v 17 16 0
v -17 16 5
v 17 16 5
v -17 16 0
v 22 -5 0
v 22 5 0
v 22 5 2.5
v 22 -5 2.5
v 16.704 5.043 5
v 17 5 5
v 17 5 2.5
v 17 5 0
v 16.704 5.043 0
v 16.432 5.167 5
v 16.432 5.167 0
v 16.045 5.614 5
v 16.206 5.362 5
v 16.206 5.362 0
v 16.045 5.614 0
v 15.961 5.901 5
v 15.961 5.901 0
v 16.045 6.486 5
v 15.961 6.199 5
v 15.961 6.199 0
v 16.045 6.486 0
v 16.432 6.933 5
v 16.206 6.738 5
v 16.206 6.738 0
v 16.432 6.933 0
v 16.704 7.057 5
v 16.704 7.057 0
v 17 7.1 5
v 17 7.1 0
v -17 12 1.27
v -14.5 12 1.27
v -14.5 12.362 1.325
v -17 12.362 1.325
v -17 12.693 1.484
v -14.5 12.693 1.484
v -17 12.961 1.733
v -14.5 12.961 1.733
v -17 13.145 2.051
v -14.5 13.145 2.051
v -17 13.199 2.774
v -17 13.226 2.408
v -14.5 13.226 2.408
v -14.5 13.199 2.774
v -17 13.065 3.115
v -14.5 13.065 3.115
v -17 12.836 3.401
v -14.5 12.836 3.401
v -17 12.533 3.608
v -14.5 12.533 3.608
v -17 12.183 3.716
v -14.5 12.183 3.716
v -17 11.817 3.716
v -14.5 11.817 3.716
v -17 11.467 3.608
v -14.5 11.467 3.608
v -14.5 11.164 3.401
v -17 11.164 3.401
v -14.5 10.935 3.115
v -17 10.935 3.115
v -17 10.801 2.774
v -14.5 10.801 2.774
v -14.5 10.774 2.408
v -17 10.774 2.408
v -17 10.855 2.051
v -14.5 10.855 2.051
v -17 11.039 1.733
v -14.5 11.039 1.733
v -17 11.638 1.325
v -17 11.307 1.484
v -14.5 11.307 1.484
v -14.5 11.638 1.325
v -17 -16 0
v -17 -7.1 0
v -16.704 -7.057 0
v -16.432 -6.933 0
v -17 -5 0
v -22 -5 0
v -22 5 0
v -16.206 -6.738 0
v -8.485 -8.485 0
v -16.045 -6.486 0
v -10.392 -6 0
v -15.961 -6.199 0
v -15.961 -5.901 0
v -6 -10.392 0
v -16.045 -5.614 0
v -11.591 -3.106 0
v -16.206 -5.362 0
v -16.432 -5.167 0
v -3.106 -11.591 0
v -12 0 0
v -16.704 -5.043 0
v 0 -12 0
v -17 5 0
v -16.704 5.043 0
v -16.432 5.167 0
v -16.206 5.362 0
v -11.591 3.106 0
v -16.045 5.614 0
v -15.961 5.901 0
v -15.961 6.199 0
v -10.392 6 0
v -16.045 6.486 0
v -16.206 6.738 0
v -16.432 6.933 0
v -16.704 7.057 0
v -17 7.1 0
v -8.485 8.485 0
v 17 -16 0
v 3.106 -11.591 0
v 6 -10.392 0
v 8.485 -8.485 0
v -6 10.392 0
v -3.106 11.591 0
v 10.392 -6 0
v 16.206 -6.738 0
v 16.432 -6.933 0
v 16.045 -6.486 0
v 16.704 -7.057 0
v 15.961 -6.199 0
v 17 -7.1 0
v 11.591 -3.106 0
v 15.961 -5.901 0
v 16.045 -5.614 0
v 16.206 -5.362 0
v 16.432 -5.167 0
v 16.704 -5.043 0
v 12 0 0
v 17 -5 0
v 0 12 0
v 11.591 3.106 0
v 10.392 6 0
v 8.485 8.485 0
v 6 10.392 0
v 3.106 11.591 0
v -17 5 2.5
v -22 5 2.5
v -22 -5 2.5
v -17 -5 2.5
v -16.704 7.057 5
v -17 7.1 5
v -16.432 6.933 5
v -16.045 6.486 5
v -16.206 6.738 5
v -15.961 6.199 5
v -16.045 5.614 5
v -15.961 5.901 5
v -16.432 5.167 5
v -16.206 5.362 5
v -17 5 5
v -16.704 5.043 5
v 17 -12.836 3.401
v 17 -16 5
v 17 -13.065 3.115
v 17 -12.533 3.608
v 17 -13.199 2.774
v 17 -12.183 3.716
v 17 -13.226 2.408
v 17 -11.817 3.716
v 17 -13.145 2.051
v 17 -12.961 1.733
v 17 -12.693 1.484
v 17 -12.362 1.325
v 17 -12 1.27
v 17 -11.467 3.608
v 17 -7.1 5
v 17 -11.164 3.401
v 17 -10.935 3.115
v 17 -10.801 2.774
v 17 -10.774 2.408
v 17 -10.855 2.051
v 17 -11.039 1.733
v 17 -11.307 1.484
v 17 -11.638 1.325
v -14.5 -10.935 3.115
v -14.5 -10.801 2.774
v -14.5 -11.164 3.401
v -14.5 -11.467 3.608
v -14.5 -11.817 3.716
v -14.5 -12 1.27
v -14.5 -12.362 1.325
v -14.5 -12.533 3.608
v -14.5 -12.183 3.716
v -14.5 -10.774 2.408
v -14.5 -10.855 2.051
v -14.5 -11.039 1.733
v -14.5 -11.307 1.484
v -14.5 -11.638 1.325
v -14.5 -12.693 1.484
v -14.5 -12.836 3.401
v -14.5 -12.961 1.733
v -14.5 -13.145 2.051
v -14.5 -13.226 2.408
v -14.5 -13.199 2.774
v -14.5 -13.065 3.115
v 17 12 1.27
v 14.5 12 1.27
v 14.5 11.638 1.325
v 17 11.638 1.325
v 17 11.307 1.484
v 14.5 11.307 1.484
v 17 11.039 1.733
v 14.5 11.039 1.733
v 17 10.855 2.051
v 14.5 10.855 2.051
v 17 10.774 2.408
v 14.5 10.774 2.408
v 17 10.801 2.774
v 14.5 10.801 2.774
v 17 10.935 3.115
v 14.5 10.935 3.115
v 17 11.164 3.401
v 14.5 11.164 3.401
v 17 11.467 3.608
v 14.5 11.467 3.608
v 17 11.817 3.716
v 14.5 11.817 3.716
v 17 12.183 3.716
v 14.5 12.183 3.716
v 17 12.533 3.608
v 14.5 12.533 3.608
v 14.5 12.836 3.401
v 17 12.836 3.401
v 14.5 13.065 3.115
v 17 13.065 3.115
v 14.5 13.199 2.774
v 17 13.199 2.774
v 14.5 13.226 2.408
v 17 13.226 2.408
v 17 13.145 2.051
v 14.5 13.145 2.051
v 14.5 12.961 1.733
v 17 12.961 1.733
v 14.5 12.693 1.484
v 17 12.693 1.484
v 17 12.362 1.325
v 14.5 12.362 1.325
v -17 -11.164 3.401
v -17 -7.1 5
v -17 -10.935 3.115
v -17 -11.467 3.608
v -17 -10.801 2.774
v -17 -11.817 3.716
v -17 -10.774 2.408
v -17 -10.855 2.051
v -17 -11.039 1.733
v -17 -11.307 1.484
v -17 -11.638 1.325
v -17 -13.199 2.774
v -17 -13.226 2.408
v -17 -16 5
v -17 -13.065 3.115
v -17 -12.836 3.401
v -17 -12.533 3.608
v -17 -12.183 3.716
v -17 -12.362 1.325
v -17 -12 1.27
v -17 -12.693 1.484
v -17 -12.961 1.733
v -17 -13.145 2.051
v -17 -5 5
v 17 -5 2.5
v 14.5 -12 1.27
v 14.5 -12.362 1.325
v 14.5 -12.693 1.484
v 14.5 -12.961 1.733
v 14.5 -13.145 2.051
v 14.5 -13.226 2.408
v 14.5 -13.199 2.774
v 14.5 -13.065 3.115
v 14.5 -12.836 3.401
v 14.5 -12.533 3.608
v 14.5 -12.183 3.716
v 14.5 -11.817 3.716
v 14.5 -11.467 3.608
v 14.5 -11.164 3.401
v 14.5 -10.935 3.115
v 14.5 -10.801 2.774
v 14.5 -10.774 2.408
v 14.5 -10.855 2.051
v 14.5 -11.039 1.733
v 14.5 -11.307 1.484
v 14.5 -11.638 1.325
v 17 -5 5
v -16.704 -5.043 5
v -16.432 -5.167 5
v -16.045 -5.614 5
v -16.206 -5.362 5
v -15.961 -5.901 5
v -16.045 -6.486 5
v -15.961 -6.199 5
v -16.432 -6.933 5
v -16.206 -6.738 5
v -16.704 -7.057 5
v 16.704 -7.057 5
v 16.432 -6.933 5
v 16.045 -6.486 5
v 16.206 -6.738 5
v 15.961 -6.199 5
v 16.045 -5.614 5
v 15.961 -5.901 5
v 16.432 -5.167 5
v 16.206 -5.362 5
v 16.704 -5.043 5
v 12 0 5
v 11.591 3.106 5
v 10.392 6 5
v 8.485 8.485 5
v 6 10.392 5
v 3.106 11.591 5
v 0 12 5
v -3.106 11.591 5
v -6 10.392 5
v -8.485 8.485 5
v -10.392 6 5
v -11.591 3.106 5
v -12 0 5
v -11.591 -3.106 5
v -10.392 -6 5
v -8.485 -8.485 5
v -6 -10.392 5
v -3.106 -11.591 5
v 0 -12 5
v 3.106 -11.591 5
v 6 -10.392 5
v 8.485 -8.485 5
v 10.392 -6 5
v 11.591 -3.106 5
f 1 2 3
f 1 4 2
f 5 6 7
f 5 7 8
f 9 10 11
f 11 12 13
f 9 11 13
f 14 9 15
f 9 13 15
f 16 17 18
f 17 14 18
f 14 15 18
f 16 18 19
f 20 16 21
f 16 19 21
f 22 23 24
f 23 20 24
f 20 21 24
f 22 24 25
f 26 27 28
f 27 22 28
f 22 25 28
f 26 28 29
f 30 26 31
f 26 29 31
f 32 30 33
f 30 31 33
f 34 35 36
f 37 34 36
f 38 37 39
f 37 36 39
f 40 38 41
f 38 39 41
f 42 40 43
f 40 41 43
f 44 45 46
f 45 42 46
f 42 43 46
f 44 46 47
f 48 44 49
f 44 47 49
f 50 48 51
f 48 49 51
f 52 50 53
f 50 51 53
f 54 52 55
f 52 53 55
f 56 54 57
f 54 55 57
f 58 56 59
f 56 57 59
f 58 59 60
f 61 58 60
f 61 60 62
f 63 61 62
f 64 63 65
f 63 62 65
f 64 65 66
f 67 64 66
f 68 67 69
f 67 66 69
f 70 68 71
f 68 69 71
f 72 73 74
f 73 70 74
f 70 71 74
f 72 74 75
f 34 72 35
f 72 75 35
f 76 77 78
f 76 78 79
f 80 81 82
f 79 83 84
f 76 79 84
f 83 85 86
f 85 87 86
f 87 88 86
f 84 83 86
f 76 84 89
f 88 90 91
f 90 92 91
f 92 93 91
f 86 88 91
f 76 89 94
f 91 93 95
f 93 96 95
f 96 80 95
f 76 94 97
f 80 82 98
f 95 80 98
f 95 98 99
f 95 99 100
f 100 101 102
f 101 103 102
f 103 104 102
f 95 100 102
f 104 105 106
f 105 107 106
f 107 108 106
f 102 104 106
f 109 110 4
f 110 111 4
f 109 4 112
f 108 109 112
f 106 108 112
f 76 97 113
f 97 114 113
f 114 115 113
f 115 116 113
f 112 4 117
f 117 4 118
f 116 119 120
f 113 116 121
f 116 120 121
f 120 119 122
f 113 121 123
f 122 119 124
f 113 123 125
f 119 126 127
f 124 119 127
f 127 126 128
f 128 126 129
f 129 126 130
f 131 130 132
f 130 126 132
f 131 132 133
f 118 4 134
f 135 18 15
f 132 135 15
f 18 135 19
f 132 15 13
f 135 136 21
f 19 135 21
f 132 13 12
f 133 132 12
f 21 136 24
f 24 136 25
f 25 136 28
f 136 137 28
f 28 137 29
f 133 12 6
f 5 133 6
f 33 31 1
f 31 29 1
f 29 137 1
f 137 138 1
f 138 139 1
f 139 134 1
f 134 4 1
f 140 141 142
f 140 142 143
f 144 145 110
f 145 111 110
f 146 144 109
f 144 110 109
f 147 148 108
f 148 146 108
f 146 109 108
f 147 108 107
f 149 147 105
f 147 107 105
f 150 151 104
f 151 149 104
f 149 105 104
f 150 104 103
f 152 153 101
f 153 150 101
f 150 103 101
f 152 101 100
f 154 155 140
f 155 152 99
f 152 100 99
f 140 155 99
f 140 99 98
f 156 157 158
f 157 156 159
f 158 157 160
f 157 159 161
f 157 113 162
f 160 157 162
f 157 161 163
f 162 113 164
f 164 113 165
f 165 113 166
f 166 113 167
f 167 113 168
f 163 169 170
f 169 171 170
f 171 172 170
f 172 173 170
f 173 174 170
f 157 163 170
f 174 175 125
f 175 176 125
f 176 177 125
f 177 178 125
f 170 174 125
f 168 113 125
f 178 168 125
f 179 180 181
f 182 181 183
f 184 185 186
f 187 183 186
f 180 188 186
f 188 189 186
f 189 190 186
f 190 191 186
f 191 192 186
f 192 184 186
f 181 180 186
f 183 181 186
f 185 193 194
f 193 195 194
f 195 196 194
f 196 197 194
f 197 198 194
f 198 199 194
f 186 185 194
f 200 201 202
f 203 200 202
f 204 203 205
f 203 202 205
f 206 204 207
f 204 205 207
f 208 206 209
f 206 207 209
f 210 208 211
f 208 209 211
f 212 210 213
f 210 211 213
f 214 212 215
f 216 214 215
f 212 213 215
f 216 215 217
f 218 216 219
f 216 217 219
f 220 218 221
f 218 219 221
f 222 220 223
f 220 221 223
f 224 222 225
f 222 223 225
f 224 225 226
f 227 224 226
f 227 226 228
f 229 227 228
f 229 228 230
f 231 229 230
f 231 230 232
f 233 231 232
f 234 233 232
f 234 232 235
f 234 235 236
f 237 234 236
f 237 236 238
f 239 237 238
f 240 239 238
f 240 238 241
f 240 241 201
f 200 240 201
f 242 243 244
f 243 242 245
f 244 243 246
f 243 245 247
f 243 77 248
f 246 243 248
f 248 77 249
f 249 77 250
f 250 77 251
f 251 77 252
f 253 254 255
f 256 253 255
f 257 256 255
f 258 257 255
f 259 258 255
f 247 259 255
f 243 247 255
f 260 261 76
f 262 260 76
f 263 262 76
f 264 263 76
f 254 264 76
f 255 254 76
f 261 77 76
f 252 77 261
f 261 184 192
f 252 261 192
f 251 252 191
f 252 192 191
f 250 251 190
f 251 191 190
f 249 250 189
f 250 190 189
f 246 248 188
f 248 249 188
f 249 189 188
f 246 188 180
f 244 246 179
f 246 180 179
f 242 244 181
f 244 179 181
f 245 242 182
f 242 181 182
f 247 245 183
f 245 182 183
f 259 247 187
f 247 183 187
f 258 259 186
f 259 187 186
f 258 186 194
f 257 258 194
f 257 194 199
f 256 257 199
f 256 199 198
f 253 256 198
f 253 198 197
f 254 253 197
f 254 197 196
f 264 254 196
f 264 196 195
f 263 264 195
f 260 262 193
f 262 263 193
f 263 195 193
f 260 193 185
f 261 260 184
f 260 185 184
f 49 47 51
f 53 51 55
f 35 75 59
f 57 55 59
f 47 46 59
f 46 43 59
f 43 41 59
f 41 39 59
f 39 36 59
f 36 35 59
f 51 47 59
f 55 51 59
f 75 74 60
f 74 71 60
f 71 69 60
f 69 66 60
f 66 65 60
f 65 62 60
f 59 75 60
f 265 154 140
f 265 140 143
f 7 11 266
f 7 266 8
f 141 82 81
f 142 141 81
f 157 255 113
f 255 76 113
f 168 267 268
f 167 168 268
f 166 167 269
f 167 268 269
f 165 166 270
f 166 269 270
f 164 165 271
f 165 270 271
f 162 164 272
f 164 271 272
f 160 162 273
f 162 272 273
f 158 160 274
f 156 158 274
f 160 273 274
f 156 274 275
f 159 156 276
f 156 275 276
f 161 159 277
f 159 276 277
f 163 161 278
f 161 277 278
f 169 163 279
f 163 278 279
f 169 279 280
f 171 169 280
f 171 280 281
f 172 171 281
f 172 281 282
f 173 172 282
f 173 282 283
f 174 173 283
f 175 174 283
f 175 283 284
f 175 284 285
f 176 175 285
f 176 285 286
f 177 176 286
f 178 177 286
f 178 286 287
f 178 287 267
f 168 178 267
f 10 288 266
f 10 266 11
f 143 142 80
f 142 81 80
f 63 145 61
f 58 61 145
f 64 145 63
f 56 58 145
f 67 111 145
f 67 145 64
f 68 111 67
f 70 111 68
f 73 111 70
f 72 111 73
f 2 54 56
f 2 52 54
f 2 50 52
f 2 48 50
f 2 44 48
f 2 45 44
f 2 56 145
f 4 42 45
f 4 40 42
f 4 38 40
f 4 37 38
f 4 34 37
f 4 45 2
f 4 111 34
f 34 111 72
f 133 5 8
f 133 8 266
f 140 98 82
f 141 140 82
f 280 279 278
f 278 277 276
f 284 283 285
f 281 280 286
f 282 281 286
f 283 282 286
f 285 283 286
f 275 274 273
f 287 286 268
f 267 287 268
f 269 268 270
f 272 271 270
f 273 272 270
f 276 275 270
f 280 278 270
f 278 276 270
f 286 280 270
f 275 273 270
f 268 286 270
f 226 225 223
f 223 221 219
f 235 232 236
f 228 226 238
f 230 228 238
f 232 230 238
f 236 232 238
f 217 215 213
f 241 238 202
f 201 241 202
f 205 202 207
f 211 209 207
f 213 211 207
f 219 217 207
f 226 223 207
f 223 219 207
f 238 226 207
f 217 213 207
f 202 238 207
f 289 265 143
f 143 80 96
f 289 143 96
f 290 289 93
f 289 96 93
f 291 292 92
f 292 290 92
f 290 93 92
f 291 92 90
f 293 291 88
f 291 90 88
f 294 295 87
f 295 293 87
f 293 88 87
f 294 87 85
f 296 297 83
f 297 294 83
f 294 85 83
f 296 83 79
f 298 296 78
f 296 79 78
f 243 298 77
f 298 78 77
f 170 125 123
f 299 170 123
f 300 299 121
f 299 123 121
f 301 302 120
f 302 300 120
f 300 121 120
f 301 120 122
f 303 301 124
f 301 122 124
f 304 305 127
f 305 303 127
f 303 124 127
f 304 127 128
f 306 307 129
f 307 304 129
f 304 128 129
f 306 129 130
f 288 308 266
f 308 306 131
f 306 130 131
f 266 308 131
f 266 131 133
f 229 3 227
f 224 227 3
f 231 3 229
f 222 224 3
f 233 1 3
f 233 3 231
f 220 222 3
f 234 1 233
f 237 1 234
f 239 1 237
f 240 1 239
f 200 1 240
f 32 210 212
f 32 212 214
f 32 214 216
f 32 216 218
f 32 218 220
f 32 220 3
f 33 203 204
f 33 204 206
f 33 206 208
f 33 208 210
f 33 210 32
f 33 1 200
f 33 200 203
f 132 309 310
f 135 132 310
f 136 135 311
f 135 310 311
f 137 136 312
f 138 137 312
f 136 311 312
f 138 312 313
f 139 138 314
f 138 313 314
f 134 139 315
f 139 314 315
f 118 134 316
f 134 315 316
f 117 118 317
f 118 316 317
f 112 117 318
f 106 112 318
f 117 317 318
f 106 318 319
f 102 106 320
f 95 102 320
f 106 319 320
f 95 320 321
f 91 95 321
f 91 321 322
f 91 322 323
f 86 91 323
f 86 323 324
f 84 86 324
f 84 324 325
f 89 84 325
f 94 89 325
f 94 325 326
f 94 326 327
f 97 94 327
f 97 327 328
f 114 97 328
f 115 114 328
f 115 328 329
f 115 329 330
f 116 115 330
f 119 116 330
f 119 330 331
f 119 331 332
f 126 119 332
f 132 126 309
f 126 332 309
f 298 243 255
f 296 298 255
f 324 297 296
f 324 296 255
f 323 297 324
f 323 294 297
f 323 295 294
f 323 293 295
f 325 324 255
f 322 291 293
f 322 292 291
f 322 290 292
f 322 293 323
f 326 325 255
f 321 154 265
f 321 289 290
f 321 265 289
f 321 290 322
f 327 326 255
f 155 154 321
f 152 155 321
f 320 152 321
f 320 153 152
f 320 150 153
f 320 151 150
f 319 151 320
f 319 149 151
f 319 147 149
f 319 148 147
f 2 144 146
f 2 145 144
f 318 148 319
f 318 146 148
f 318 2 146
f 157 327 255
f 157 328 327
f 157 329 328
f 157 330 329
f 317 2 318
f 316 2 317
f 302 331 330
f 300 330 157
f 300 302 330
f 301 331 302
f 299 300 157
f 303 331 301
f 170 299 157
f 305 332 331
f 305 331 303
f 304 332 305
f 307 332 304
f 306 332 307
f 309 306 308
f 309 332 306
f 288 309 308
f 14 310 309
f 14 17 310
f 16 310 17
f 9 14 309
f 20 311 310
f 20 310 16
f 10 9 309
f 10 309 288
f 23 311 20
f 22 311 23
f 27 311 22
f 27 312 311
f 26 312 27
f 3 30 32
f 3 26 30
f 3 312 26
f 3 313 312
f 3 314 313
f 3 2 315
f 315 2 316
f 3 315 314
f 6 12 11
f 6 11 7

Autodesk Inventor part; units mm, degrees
ref_plane "YZ Plane" through (0, 0, 0) normal (1, 0, 0) x (0, 1, 0)
ref_plane "XZ Plane" through (0, 0, 0) normal (0, 1, 0) x (-1, 0, 0)
ref_plane "XY Plane" through (0, 0, 0) normal (0, 0, 1) x (1, 0, 0)
sketch "スケッチ1" plane through (0, 0, 0) normal (0, 0, 1) x (1, 0, 0)
  line L0 (-17, -16) -> (17, -16) construction
  line L1 (17, -16) -> (17, 16) construction
  line L2 (17, 16) -> (-17, 16) construction
  line L3 (-17, 16) -> (-17, -16) construction
  line L4 (-17, -16) -> (17, 16) construction
  line L5 (17, -16) -> (-17, 16) construction
  line L6 (-17, 7.1) -> (-17, 16)
  line L7 (-17, 16) -> (17, 16)
  line L8 (17, 16) -> (17, 7.1)
  line L9 (-17, 5) -> (-22, 5)
  line L10 (-22, 5) -> (-22, -5)
  line L11 (-22, -5) -> (-17, -5)
  line L12 (17, 5) -> (22, 5)
  line L13 (22, 5) -> (22, -5)
  line L14 (22, -5) -> (17, -5)
  line L15 (-17, -7.1) -> (-17, -16)
  line L16 (-17, -16) -> (17, -16)
  line L17 (17, -16) -> (17, -7.1)
  arc A0 (-17, 5) -> (-17, 7.1) centre (-17, 6.05) ccw
  arc A1 (-17, -7.1) -> (-17, -5) centre (-17, -6.05) ccw
  arc A2 (17, 7.1) -> (17, 5) centre (17, 6.05) ccw
  arc A3 (17, -5) -> (17, -7.1) centre (17, -6.05) ccw
  line L18 (0, 0) -> (-17, 0) construction
  line L19 (0, 0) -> (0, 16) construction
  dimension "d87" = 32
  dimension "d88" = 1.05
  dimension "d89" = 5
  dimension "d90" = 11
  dimension "d91" = 34
extrude "押し出し1" add sketch "スケッチ1" along normal blind 5
sketch "スケッチ2" plane through (0, 0, 5) normal (0, 0, 1) x (1, 0, 0)
  line L0 (-17, 16) -> (-17, 7.1) projected
  line L1 (17, 7.1) -> (17, 16) projected
  line L2 (-28.2886, 18.8938) -> (-17, 18.8938)
  line L3 (-17, 18.8938) -> (-17, -23.6662)
  line L4 (-17, -23.6662) -> (-28.2886, -23.6662)
  line L5 (-28.2886, -23.6662) -> (-28.2886, 18.8938)
  line L6 (17, 13.565) -> (34.37, 13.565)
  line L7 (34.37, 13.565) -> (34.37, -20.2305)
  line L8 (34.37, -20.2305) -> (17, -20.2305)
  line L9 (17, -20.2305) -> (17, 13.565)
  point P0 (0, 0)
extrude "押し出し2" cut sketch "スケッチ2" against normal blind 2.5
sketch "スケッチ3" plane through (17, -16, 0) normal (1, 0, 0) x (0, 0, -1)
  line L0 (0, 0) -> (-5, 0) projected
  line L1 (-5, 11) -> (-5, 21) construction
  line L2 (-5, 16) -> (0, 16) construction
  point P0 (-2.5, 4)
  point P1 (-2.5, 28)
  point P2 (-2.5, 0)
  dimension "d96" = 4
hole "穴1" at (17, -12, 2.5) at (17, 12, 2.5) direction (-1, 0, 0) diameter 2.459 depth 2.5 thread size "M3x0.5" class "6H" standard "ISO Metric profile"
mirror "ミラー1" about plane through (0, 0, 0) normal (1, 0, 0) of "穴1"
sketch "スケッチ4" plane through (0, 0, 5) normal (0, 0, 1) x (1, 0, 0)
  line L0 (-17, -16) -> (17, -16) projected
  line L1 (17, -16) -> (17, -7.1) projected
  line L2 (10, 12) -> (-10, 12) construction
  line L3 (-10, 12) -> (-10, -12) construction
  line L4 (-10, -12) -> (10, -12) construction
  line L5 (10, -12) -> (10, 12) construction
  line L6 (10, 12) -> (-10, -12) construction
  line L7 (-10, 12) -> (10, -12) construction
  circle A0 centre (0, 0) radius 12
  dimension "d104" = 4
  dimension "d105" = 7
extrude "押し出し3" cut sketch "スケッチ4" against normal blind 10
equation "\"d87\" = d3"
equation "\"d90\" = d77 + d82"
equation "\"d96\" = d77"
equation "\"d3\" = 32"
equation "\"d77\" = 4"
equation "\"d82\" = 7"
properties part number "コックピット_2_サブフレーム_6" material "アセタール樹脂、黒"
